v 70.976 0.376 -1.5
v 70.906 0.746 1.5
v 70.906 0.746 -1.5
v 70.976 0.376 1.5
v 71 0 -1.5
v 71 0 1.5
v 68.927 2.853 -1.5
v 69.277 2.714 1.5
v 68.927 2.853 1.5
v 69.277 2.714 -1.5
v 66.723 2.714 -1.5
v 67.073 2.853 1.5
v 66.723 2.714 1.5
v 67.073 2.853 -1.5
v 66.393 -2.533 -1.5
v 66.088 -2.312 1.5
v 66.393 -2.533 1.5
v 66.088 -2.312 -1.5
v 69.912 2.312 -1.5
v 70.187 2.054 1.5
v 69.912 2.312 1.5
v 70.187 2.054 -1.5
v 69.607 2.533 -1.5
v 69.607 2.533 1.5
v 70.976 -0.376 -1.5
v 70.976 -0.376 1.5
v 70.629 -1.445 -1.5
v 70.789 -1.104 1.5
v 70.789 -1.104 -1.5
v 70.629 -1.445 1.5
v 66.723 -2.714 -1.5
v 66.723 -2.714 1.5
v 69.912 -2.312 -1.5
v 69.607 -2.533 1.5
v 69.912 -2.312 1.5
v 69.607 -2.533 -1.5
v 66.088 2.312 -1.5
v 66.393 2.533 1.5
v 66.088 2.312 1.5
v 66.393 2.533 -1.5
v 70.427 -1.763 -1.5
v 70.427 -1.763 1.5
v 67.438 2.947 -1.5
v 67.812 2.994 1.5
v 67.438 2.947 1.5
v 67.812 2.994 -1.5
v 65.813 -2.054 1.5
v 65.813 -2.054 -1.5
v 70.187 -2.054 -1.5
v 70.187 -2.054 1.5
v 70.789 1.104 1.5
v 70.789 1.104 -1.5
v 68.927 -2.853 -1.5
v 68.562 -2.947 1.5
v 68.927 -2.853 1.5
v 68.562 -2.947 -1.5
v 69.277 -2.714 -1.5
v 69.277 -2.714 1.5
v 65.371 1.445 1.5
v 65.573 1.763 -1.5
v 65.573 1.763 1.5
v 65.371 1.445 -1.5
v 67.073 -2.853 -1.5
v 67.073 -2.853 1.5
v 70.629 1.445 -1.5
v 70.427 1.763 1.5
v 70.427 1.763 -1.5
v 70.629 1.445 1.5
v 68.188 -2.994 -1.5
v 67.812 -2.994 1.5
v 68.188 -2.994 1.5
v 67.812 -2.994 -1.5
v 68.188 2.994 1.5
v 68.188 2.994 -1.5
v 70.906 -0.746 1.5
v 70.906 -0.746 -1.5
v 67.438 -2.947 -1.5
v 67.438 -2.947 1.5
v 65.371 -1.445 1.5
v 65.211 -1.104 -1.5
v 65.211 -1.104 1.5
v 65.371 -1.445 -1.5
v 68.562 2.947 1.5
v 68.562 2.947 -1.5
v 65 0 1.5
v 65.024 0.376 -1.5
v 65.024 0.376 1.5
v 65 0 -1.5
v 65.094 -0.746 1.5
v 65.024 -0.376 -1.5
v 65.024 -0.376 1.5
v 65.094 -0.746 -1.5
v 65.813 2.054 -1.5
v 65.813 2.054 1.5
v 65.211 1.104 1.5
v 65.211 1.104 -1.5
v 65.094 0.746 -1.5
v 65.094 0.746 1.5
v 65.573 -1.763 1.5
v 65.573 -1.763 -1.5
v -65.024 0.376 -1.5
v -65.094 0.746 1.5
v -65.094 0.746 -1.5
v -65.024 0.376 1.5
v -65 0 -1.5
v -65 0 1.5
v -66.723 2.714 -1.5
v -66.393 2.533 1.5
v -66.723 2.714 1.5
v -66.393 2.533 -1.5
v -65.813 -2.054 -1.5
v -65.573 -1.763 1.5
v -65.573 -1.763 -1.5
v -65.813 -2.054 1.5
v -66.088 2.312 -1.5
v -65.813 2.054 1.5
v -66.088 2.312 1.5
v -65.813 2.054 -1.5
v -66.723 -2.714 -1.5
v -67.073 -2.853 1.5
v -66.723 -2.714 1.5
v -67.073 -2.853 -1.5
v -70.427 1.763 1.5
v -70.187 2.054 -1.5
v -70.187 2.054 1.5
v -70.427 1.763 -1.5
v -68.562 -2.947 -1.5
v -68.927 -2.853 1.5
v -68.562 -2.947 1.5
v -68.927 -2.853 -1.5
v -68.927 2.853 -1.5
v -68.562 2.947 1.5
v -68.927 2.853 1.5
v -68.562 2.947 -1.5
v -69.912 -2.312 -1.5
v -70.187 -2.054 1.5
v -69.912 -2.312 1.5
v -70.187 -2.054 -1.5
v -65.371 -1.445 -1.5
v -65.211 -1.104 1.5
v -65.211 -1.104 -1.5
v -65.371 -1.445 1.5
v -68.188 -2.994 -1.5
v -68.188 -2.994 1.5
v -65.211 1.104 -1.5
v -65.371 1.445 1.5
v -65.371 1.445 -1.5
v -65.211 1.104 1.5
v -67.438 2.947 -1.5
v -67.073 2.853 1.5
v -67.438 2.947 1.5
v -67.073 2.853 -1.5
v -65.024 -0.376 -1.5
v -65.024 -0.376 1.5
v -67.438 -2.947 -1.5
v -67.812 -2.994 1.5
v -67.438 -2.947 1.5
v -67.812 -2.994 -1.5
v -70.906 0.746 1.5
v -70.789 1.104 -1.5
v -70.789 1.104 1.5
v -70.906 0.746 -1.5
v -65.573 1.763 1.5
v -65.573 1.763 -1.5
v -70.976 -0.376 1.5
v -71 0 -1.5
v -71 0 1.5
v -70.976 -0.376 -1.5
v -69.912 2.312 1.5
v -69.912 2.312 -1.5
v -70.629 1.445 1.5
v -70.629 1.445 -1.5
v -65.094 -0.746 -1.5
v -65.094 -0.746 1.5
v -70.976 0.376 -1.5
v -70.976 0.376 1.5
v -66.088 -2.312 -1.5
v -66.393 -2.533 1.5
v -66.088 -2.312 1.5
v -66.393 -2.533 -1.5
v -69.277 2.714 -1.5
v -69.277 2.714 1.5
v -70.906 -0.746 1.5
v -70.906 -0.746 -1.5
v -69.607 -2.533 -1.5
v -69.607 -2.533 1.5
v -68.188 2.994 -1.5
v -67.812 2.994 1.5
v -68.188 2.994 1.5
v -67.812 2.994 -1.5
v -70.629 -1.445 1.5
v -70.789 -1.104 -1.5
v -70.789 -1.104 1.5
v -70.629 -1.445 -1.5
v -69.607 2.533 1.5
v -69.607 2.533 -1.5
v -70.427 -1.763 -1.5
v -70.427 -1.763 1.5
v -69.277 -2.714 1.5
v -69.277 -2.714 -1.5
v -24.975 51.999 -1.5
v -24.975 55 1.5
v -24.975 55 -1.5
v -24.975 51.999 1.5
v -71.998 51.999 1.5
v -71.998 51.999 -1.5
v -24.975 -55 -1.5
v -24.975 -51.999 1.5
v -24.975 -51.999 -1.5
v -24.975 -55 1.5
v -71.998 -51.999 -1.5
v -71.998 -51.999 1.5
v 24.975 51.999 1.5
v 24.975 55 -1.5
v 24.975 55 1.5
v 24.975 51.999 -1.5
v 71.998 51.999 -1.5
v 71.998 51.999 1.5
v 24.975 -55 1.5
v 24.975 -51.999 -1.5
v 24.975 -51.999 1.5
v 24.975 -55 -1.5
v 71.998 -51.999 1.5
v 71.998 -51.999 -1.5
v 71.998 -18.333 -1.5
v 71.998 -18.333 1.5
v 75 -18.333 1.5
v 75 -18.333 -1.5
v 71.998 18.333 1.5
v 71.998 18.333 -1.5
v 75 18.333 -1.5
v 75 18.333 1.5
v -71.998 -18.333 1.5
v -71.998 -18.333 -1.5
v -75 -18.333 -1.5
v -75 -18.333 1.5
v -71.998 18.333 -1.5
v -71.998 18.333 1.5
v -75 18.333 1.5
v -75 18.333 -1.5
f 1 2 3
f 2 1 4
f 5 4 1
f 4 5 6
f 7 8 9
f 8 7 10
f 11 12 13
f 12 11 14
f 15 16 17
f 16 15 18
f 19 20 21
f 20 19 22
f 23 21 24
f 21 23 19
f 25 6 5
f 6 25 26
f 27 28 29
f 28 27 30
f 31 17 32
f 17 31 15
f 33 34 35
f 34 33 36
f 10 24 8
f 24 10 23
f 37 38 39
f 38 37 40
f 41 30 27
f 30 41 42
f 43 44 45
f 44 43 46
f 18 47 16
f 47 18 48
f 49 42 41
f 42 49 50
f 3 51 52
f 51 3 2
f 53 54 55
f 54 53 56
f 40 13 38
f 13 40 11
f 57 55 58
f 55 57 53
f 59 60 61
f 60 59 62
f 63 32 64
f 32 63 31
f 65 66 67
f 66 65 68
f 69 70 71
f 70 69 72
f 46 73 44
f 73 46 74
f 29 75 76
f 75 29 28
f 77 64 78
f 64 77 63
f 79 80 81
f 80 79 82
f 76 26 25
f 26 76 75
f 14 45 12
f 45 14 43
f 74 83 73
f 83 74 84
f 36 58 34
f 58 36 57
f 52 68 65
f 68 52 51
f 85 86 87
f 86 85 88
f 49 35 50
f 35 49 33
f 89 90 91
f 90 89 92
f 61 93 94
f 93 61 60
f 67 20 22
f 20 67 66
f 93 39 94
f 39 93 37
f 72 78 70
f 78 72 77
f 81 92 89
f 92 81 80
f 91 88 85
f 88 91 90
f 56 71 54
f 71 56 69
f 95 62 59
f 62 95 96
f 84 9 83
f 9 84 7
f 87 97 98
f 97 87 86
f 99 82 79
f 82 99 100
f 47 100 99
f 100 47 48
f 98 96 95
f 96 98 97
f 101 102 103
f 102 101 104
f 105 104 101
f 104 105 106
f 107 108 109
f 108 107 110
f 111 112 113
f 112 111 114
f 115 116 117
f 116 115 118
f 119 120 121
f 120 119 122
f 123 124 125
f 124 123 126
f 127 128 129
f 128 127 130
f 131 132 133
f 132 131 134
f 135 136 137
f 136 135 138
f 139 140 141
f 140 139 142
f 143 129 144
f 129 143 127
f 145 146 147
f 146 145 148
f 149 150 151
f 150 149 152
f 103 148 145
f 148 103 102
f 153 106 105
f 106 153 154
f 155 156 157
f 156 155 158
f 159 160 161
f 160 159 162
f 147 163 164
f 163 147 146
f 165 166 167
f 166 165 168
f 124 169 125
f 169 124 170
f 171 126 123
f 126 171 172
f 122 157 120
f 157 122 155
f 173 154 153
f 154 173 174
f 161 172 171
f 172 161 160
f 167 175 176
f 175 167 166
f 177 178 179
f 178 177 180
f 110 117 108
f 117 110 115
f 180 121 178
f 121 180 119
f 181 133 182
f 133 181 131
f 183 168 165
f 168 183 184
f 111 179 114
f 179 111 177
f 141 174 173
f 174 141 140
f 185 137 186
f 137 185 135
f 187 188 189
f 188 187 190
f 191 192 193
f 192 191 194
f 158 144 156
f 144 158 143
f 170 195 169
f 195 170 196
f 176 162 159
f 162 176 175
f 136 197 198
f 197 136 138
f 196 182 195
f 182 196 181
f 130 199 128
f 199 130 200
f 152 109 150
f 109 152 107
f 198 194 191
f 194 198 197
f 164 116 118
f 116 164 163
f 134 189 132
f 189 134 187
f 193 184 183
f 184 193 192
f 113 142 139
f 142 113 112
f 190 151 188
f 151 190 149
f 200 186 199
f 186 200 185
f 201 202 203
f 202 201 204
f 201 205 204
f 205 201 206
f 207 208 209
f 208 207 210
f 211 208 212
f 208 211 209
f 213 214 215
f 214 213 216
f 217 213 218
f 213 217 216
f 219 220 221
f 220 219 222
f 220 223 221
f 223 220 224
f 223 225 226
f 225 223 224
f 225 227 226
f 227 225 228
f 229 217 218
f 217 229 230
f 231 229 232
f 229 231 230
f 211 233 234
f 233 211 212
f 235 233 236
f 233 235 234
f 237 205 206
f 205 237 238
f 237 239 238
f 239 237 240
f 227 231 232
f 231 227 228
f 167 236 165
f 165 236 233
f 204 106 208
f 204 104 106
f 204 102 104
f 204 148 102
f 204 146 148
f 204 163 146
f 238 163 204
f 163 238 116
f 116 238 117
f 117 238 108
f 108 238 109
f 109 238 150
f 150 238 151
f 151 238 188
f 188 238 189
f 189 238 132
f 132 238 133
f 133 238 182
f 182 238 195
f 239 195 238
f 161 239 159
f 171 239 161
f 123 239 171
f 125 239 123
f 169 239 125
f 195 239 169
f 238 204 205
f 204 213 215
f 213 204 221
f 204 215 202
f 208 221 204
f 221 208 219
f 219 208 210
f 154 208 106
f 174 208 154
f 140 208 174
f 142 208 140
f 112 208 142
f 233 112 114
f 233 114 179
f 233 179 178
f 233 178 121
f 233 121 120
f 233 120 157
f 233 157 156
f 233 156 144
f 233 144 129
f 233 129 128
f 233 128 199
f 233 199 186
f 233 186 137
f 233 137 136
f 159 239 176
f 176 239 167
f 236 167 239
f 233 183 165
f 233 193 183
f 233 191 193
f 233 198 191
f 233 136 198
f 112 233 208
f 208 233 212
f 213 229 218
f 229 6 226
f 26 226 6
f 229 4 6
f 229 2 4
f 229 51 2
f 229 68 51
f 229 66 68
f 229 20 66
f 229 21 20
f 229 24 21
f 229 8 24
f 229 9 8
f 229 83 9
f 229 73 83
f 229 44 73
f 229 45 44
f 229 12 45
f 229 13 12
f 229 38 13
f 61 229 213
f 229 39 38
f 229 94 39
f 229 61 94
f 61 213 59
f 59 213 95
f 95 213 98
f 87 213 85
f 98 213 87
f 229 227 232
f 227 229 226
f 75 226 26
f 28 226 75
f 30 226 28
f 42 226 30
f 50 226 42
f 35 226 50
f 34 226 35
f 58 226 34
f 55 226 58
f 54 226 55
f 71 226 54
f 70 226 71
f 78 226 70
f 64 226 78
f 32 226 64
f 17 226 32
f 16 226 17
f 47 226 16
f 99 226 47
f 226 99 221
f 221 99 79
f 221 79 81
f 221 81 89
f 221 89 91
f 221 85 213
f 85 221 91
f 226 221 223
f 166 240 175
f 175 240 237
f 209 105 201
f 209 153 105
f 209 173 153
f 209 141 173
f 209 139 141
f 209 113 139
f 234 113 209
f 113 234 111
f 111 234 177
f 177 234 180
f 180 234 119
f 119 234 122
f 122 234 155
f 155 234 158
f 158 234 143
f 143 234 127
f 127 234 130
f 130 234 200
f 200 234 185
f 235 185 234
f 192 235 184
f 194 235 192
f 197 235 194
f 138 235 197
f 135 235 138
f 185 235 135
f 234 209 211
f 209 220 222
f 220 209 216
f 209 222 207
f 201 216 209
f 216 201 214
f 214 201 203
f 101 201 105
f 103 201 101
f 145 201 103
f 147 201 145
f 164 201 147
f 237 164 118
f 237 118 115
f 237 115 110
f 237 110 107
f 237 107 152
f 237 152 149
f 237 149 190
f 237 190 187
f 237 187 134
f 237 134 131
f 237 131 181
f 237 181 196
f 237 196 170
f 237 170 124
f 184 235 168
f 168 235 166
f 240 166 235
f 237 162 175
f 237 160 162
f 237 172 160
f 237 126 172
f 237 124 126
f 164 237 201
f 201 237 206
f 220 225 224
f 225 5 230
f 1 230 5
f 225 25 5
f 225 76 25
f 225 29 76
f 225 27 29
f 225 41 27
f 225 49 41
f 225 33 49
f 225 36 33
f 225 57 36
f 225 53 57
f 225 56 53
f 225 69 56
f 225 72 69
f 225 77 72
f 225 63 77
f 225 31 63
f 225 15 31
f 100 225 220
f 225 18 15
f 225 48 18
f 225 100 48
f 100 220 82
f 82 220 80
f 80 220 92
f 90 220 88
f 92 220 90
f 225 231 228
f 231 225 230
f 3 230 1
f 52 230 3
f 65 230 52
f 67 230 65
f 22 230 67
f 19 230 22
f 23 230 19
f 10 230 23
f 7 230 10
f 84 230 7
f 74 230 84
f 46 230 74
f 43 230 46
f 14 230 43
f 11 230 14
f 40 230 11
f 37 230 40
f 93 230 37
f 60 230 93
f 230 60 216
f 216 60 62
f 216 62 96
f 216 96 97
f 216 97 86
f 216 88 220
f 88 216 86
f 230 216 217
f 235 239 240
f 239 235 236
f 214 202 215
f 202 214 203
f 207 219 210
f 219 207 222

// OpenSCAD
// file: measures.scad
/*
 * All measures of the model
 * Default units: Millimeters
 */

// rendering parameters
$fn = 50;

// material to cut from
material_x = 430;
material_y = 270;
material_z = 3;

// house cuboid
house_x = 150;
house_y = 110;
house_z = 60;

// distances from left and bottom house edges
door_x = 35;
door_z = 35;
door_radius = 35/2;

window_z = 12;

// how many holes per edge
strap_hole_count = 1;
strap_hole_radius = 3;
strap_hole_spacing = house_y/(strap_hole_count+1);
strap_hole_to_edge = 7;

// angle between upper house cuboid edge and roof plane in degrees
roof_angle = 30;

// elevation inside roof corner above upper edge of house cuboid
roof_elevation = tan(roof_angle) * house_x/2;

// length of a roof plane from top corner to house cuboid corner
roof_hypothenuse = 1/cos(roof_angle) * house_x/2;

// make roof a little longer than required
roof_plane_x = roof_hypothenuse * 1.2;
roof_plane_y = house_y * 1.2;

screw_radius = 4;
screw_length = 20;
washer_radius = 9;
nut_height = 3.2;
nut_wrench_size = 7;
// length between screw head and upper edge of nut
nut_position = 7;
// main file
include <measures.scad>;

module face_bottom()
{
    difference()
    {
        cube([
            house_x,
            house_y,
            material_z
            ], center=true);

        // hole cutouts
        for (x = [house_x/2 - strap_hole_to_edge, -house_x/2 + strap_hole_to_edge])
        {
            for (i=[1:strap_hole_count])
            {
                translate([
                    x,
                    -house_y/2 + i*strap_hole_spacing,
                    0
                    ])
                cylinder(
                    r=strap_hole_radius,
                    h=material_z*1.2,
                    center=true
                    );
            }
        }

        // nose cutouts front and back
        for (x=[-house_x/3, +house_x/3])
        {
            for (y=[+house_y/2-material_z/2, -house_y/2+material_z/2])
            {
                translate([
                    x,
                    y,
                    0
                    ])
                cube([
                    house_x/3*1.001,
                    material_z*1.001,
                    material_z*1.2
                    ], center=true);
            }
        }

        // nose cutout on the sides
        for (x=[+house_x/2-material_z/2, -house_x/2+material_z/2])
        {
            for (y=[-house_y/3, +house_y/3])
            {
                translate([
                    x,
                    y,
                    0
                    ])
                cube([
                    material_z*1.001,
                    house_y/3,
                    material_z*1.2
                    ], center=true);
            }
        }
    }
}

face_bottom();
